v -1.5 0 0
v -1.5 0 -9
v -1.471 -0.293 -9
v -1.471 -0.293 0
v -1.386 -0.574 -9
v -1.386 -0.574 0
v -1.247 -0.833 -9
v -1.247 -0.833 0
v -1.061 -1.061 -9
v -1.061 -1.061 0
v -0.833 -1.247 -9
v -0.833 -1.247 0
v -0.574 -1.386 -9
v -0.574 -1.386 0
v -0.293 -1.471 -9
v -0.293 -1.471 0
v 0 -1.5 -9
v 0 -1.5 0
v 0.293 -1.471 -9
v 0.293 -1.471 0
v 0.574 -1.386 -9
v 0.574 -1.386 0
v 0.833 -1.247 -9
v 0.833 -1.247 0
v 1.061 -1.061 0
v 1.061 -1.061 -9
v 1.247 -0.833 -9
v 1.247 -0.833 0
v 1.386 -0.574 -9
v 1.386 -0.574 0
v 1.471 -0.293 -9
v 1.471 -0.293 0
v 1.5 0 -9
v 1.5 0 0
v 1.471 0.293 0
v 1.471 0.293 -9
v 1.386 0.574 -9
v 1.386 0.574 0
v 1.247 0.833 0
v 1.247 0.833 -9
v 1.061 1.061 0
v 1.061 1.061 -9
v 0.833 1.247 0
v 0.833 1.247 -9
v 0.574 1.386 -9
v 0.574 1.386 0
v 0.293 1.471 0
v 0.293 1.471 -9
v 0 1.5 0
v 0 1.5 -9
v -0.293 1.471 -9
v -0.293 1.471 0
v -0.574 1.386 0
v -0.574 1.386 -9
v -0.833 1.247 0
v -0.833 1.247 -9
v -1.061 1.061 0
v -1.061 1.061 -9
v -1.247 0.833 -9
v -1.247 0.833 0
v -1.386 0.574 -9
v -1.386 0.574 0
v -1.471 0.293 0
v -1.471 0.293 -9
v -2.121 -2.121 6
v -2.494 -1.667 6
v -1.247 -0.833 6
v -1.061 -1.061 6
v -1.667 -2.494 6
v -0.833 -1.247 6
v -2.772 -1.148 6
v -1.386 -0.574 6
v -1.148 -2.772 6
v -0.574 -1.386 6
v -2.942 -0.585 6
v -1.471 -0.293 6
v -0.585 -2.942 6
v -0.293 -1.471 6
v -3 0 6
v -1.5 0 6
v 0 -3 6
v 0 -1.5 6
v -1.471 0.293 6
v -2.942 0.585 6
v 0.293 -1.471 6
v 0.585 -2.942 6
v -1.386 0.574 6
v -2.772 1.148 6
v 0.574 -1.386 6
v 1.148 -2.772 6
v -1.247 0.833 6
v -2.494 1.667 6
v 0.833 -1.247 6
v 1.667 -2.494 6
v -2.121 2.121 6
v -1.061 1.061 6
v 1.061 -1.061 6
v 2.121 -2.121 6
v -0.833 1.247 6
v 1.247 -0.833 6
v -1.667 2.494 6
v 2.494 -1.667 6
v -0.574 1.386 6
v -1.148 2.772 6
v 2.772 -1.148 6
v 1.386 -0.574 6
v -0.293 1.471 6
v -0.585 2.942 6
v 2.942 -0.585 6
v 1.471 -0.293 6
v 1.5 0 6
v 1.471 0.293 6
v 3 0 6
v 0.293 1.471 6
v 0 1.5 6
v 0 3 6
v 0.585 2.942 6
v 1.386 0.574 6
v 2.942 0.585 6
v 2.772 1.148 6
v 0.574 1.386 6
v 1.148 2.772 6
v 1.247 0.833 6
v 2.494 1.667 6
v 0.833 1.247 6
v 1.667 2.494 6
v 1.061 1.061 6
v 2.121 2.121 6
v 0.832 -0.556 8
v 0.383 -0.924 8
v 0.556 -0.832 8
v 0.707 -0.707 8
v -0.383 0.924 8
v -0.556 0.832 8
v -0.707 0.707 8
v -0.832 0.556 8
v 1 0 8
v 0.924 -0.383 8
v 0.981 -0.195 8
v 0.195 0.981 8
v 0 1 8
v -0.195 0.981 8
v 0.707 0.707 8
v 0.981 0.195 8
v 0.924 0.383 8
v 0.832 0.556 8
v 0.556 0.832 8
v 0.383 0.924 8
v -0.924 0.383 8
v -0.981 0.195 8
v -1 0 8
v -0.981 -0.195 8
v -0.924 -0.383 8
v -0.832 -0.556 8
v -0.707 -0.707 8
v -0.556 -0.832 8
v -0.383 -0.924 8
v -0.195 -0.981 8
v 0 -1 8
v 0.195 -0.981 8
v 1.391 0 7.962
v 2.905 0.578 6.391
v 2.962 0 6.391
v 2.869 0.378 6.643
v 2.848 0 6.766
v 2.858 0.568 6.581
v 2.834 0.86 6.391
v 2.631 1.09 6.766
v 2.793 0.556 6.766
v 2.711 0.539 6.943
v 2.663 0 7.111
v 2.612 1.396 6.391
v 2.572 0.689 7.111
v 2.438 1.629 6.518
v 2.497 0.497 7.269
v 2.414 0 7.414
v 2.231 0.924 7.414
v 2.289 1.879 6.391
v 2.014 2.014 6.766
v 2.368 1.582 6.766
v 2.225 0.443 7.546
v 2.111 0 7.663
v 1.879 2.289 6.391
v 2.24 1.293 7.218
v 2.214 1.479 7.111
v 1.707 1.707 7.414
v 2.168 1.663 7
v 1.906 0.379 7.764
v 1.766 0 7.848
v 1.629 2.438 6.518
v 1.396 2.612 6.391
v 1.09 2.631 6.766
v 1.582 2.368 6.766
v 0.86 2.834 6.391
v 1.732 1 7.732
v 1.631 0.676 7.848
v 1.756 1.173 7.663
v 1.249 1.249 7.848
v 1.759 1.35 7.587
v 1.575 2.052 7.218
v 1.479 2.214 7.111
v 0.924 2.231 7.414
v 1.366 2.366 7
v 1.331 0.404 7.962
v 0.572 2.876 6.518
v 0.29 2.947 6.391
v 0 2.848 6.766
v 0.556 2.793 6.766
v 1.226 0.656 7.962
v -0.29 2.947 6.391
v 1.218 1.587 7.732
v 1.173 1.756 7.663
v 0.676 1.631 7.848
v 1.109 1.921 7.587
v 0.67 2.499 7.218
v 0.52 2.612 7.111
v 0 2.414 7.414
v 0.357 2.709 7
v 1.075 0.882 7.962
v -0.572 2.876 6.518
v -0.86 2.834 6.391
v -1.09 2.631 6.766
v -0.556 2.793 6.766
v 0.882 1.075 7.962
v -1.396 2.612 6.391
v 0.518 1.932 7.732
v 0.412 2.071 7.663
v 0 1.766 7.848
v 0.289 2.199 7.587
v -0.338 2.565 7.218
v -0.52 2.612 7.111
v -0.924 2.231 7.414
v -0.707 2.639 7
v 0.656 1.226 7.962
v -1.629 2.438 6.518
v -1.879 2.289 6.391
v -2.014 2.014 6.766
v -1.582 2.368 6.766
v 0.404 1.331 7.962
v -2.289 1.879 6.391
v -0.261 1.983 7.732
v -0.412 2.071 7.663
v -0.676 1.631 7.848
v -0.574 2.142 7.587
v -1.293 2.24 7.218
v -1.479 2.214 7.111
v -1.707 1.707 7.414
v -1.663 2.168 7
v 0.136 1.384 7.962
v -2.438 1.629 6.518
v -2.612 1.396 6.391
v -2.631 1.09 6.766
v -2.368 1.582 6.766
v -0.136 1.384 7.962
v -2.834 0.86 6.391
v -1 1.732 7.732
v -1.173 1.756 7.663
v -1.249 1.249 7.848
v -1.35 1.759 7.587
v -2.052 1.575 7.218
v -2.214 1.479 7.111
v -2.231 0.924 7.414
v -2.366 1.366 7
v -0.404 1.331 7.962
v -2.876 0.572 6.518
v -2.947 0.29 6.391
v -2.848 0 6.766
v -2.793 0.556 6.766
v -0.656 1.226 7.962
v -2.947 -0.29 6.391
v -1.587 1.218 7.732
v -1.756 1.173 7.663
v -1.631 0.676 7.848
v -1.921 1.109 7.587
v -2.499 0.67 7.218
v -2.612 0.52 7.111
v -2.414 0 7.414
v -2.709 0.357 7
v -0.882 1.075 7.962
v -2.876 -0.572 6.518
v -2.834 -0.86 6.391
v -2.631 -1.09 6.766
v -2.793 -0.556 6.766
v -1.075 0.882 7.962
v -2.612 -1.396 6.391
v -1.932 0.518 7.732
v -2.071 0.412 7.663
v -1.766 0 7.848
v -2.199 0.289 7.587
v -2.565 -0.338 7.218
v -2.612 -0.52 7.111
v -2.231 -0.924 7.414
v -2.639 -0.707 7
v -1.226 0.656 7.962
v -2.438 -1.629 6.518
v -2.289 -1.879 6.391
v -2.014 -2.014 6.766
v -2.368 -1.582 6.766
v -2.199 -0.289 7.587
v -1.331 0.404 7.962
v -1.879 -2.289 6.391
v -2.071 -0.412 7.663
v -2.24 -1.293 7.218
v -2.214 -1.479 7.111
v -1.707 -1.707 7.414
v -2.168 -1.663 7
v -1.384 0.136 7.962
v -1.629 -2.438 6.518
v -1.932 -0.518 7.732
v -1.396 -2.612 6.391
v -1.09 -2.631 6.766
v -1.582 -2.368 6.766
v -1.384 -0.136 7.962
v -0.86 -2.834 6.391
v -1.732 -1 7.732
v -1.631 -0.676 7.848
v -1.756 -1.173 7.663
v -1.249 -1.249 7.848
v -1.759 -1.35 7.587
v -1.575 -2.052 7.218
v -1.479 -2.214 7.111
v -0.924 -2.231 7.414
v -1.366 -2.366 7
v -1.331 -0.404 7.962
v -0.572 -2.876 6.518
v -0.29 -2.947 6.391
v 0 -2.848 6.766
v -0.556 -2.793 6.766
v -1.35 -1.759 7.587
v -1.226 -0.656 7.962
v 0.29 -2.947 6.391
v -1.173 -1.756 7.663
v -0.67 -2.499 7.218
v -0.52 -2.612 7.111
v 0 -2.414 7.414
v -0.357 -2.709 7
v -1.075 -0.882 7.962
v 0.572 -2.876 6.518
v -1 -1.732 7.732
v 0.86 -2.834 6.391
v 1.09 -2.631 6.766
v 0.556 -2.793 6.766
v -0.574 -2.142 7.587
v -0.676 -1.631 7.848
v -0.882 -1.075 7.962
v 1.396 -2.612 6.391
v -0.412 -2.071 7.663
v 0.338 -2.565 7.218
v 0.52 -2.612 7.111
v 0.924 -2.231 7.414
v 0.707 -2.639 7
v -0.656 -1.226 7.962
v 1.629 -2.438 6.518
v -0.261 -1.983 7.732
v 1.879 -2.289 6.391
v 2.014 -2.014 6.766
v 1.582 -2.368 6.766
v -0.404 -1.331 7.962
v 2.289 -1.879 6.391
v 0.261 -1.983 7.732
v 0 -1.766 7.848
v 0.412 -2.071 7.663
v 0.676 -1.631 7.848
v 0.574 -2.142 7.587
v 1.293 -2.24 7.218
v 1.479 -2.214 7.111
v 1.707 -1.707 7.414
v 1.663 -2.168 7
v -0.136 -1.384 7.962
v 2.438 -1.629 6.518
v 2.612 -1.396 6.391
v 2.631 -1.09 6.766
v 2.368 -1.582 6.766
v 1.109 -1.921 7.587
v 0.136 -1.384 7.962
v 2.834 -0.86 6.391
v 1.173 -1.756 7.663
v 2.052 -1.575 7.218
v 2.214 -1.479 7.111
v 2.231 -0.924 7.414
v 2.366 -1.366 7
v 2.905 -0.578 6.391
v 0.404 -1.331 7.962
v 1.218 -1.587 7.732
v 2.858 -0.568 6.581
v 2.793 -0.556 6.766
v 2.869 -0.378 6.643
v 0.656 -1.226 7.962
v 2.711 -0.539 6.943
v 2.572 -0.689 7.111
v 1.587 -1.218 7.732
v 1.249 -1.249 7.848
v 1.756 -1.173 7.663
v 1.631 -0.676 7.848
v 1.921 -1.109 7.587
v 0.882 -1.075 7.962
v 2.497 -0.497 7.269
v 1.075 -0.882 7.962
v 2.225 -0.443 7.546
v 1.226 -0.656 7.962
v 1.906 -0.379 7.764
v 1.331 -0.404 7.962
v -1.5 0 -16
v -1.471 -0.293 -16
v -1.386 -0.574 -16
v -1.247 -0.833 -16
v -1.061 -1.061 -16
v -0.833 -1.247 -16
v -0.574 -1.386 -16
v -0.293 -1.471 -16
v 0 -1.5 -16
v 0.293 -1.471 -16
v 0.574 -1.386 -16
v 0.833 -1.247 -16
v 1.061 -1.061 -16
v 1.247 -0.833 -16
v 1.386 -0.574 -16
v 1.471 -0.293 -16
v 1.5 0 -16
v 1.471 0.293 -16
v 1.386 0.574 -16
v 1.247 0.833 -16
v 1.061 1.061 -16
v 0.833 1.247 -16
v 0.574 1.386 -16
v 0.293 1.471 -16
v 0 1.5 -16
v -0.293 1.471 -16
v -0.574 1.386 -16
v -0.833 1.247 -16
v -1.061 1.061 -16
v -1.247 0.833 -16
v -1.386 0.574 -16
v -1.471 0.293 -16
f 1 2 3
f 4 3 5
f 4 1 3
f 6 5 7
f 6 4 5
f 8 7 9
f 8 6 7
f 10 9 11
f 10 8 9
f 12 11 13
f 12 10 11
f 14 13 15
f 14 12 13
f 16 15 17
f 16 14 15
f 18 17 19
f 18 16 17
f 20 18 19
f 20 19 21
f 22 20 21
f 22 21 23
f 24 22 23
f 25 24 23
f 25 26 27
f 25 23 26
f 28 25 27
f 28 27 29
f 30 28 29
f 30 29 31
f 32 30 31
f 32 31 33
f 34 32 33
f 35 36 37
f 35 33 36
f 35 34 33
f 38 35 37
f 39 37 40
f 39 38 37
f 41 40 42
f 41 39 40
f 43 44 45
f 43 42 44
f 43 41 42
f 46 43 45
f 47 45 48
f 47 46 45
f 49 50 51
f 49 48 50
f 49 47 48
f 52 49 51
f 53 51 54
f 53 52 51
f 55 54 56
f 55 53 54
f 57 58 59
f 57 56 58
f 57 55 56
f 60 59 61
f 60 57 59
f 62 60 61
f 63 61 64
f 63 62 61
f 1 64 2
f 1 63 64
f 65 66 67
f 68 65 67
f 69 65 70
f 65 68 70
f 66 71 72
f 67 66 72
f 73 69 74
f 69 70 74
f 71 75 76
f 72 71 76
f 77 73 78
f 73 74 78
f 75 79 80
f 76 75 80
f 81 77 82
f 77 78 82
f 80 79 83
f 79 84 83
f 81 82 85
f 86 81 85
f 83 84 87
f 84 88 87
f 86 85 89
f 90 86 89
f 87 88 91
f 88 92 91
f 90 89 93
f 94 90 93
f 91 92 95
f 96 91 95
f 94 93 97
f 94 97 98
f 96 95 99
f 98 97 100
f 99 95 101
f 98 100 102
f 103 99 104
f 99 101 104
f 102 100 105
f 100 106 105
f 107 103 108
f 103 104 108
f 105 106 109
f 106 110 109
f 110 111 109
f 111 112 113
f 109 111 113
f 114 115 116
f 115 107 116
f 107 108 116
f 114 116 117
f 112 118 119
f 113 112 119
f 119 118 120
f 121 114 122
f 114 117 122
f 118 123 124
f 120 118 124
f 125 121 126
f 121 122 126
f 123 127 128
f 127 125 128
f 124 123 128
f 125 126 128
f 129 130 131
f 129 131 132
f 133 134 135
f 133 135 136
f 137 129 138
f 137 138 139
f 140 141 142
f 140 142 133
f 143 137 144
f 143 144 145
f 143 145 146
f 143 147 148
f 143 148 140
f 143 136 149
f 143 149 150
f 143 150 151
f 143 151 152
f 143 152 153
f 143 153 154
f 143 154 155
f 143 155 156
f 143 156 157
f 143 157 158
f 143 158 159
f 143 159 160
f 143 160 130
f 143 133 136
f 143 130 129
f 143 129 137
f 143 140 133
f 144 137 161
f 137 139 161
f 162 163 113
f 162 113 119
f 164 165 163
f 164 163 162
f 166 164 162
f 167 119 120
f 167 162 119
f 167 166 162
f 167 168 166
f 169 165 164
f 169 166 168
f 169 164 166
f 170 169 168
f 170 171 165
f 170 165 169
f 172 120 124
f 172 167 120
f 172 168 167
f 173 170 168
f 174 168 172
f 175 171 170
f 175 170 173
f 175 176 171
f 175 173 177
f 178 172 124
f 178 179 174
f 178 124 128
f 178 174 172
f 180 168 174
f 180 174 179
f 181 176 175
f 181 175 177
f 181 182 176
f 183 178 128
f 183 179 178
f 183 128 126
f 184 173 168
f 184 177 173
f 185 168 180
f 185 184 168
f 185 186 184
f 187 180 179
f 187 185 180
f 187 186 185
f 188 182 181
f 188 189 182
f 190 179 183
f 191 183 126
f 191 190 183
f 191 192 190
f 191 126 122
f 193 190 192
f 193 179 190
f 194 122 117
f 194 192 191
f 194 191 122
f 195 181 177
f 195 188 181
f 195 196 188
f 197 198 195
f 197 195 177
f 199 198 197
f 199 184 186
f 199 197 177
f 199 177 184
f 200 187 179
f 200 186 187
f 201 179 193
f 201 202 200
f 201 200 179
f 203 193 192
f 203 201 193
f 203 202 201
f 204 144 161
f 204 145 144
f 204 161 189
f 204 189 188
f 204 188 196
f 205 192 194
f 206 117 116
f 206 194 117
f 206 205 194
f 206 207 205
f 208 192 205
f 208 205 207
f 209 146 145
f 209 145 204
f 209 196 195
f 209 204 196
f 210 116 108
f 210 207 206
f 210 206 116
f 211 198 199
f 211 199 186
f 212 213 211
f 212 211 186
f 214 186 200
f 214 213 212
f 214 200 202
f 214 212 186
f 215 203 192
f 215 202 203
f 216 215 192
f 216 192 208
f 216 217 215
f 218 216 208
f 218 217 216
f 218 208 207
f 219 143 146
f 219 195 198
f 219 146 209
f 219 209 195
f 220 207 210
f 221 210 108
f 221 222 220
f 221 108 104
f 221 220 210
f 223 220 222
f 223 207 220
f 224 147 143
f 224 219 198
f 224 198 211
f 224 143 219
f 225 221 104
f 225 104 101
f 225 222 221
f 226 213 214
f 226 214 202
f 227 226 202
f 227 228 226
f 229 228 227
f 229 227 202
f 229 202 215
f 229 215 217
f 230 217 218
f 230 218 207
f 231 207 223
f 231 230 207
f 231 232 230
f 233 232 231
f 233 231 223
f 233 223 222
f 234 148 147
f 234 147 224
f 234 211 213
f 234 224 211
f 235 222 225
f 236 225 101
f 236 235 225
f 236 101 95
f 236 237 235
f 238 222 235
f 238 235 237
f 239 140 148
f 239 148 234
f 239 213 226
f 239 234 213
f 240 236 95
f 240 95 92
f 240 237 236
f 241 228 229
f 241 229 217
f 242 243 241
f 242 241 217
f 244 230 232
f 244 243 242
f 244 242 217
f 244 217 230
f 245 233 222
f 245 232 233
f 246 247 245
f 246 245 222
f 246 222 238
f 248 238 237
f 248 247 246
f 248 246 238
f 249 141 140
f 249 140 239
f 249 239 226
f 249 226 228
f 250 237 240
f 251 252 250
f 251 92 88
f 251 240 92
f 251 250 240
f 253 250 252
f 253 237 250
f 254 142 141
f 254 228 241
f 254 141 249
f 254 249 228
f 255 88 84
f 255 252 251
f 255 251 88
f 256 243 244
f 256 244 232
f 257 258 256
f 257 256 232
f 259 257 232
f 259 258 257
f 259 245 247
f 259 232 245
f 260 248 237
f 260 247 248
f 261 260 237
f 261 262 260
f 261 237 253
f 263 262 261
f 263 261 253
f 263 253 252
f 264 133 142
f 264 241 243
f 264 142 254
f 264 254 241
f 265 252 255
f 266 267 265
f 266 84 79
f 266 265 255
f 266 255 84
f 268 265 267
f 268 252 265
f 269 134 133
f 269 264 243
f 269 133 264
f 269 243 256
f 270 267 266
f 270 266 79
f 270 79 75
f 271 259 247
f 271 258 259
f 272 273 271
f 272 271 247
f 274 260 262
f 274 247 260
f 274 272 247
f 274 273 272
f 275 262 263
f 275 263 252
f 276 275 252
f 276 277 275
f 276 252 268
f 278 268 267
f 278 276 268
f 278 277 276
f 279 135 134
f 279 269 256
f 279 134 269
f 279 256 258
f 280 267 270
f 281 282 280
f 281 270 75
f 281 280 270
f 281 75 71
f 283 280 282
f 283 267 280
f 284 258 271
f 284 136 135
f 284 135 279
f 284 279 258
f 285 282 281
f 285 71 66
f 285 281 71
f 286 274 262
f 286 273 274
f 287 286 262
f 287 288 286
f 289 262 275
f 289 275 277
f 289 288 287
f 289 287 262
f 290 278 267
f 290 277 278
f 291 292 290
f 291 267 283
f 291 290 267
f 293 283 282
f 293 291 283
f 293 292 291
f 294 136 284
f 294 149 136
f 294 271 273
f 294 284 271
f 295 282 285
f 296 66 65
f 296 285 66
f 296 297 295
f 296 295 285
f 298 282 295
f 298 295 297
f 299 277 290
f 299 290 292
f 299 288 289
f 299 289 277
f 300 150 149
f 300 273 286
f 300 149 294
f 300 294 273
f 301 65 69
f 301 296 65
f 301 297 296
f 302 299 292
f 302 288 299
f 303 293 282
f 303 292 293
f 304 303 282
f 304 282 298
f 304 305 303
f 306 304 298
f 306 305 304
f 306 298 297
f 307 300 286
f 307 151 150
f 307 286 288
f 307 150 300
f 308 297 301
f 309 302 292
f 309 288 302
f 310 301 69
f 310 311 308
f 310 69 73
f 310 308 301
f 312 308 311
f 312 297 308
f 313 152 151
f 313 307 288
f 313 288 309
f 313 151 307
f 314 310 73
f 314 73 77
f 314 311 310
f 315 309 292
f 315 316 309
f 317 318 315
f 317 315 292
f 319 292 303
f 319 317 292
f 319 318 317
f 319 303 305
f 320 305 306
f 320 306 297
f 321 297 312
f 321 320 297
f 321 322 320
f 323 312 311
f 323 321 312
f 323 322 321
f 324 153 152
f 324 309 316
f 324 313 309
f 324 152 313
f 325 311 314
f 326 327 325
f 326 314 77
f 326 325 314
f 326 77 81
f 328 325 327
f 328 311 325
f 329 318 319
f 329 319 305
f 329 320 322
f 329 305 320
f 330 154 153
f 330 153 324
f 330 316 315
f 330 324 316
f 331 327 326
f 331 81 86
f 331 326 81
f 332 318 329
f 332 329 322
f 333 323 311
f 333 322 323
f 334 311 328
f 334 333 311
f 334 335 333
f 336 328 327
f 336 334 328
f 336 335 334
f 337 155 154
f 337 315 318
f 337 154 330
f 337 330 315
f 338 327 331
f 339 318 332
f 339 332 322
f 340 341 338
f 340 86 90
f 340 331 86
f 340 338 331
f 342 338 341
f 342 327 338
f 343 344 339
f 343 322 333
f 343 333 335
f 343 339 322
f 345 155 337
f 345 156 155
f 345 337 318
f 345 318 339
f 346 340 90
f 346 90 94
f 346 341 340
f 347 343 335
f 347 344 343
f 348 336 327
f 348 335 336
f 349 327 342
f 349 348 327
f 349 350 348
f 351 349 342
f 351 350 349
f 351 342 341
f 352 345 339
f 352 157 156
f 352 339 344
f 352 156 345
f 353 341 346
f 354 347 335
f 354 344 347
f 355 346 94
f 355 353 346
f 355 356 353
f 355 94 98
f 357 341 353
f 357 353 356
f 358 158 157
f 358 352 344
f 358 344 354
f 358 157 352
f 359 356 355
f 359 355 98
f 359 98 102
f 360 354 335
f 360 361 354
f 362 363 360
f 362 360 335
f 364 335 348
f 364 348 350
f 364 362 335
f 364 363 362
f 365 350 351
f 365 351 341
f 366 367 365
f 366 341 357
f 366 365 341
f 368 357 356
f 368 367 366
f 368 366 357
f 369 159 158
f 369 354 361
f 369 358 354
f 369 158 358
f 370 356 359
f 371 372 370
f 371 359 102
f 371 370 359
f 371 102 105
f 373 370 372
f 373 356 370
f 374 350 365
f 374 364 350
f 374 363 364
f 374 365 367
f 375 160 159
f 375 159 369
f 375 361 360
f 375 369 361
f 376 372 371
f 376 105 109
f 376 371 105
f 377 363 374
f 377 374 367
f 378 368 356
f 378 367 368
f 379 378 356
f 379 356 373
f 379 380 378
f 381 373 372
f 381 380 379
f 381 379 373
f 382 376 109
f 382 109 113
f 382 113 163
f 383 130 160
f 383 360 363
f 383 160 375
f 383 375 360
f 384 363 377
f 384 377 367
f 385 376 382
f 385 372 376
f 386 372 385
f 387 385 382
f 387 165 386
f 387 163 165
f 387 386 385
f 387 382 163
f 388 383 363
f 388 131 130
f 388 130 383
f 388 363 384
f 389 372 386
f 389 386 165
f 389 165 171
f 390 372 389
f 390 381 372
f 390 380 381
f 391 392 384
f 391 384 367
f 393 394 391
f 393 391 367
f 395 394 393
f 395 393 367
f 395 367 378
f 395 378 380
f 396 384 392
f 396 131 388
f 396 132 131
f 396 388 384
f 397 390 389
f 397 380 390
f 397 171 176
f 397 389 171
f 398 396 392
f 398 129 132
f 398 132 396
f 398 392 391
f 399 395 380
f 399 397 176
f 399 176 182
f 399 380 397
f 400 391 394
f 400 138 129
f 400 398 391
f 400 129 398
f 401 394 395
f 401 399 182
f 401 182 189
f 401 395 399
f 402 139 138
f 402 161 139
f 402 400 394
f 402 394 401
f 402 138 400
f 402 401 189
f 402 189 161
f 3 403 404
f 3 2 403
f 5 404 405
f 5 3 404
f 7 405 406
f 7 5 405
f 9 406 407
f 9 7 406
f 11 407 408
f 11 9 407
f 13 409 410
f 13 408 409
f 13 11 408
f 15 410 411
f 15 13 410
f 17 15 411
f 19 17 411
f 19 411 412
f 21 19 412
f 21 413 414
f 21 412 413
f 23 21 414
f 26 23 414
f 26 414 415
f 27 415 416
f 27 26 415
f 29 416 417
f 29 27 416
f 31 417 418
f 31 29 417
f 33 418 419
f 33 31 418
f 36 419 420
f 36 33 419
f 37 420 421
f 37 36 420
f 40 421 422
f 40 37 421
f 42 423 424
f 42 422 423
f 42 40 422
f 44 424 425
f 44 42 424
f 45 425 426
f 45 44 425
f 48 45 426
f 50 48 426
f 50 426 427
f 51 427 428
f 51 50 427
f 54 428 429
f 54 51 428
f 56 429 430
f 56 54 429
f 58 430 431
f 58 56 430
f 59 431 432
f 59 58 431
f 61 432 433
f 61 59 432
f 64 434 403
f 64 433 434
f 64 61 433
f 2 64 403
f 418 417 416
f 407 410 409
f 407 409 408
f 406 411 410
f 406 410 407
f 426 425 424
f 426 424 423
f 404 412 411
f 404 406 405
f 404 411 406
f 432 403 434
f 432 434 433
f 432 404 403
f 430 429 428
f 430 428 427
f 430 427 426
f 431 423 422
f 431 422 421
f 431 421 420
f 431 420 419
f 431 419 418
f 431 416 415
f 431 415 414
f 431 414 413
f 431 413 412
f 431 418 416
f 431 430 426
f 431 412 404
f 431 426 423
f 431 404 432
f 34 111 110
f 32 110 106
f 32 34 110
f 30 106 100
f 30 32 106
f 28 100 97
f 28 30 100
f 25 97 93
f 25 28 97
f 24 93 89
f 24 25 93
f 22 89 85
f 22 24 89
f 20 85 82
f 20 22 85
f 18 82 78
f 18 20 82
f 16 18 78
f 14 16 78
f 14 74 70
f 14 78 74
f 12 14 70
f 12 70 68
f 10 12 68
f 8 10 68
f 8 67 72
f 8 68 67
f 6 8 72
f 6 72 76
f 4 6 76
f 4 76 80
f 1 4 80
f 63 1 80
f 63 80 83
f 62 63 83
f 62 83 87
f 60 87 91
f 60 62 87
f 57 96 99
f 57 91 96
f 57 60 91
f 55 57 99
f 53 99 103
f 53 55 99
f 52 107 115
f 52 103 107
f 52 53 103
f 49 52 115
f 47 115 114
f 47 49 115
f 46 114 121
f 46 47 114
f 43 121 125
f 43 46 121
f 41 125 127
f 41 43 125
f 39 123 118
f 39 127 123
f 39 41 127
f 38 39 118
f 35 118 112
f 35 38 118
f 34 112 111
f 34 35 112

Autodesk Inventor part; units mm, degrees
ref_plane "YZ Plane" through (0, 0, 0) normal (1, 0, 0) x (0, 1, 0)
ref_plane "XZ Plane" through (0, 0, 0) normal (0, 1, 0) x (-1, 0, 0)
ref_plane "XY Plane" through (0, 0, 0) normal (0, 0, 1) x (1, 0, 0)
sketch "スケッチ1" plane through (0, 0, 0) normal (0, 0, 1) x (1, 0, 0)
  circle A0 centre (0, 0) radius 1.5
  dimension "d0" = 3
extrude "押し出し1" add sketch "スケッチ1" along normal blind 6
sketch "スケッチ2" plane through (0, 0, 6) normal (0, 0, 1) x (1, 0, 0)
  circle A0 centre (0, 0) radius 1.5 projected
  circle A1 centre (0, 0) radius 3
  dimension "d3" = 6
extrude "押し出し2" add sketch "スケッチ2" along normal blind 2 contours A0 | A1
fillet "フィレット1" radius 2 1 edges at (-3, 0, 8)
thread "ねじ1" size "M3x0.5" class "6g" standard "ANSI Metric M Profile" full length
sketch "スケッチ3" plane through (0, 0, 0) normal (0, 0, -1) x (-1, 0, 0)
  circle A0 centre (0, 0) radius 1.5 projected
extrude "押し出し3" add sketch "スケッチ3" along normal blind 9
sketch "スケッチ4" plane through (0, 0, -9) normal (0, 0, -1) x (-1, 0, 0)
  circle A0 centre (0, 0) radius 1.5 projected
extrude "押し出し4" add sketch "スケッチ4" along normal blind 7
properties part number "SB　22mmなべネジ" material "Steel, Mild"
